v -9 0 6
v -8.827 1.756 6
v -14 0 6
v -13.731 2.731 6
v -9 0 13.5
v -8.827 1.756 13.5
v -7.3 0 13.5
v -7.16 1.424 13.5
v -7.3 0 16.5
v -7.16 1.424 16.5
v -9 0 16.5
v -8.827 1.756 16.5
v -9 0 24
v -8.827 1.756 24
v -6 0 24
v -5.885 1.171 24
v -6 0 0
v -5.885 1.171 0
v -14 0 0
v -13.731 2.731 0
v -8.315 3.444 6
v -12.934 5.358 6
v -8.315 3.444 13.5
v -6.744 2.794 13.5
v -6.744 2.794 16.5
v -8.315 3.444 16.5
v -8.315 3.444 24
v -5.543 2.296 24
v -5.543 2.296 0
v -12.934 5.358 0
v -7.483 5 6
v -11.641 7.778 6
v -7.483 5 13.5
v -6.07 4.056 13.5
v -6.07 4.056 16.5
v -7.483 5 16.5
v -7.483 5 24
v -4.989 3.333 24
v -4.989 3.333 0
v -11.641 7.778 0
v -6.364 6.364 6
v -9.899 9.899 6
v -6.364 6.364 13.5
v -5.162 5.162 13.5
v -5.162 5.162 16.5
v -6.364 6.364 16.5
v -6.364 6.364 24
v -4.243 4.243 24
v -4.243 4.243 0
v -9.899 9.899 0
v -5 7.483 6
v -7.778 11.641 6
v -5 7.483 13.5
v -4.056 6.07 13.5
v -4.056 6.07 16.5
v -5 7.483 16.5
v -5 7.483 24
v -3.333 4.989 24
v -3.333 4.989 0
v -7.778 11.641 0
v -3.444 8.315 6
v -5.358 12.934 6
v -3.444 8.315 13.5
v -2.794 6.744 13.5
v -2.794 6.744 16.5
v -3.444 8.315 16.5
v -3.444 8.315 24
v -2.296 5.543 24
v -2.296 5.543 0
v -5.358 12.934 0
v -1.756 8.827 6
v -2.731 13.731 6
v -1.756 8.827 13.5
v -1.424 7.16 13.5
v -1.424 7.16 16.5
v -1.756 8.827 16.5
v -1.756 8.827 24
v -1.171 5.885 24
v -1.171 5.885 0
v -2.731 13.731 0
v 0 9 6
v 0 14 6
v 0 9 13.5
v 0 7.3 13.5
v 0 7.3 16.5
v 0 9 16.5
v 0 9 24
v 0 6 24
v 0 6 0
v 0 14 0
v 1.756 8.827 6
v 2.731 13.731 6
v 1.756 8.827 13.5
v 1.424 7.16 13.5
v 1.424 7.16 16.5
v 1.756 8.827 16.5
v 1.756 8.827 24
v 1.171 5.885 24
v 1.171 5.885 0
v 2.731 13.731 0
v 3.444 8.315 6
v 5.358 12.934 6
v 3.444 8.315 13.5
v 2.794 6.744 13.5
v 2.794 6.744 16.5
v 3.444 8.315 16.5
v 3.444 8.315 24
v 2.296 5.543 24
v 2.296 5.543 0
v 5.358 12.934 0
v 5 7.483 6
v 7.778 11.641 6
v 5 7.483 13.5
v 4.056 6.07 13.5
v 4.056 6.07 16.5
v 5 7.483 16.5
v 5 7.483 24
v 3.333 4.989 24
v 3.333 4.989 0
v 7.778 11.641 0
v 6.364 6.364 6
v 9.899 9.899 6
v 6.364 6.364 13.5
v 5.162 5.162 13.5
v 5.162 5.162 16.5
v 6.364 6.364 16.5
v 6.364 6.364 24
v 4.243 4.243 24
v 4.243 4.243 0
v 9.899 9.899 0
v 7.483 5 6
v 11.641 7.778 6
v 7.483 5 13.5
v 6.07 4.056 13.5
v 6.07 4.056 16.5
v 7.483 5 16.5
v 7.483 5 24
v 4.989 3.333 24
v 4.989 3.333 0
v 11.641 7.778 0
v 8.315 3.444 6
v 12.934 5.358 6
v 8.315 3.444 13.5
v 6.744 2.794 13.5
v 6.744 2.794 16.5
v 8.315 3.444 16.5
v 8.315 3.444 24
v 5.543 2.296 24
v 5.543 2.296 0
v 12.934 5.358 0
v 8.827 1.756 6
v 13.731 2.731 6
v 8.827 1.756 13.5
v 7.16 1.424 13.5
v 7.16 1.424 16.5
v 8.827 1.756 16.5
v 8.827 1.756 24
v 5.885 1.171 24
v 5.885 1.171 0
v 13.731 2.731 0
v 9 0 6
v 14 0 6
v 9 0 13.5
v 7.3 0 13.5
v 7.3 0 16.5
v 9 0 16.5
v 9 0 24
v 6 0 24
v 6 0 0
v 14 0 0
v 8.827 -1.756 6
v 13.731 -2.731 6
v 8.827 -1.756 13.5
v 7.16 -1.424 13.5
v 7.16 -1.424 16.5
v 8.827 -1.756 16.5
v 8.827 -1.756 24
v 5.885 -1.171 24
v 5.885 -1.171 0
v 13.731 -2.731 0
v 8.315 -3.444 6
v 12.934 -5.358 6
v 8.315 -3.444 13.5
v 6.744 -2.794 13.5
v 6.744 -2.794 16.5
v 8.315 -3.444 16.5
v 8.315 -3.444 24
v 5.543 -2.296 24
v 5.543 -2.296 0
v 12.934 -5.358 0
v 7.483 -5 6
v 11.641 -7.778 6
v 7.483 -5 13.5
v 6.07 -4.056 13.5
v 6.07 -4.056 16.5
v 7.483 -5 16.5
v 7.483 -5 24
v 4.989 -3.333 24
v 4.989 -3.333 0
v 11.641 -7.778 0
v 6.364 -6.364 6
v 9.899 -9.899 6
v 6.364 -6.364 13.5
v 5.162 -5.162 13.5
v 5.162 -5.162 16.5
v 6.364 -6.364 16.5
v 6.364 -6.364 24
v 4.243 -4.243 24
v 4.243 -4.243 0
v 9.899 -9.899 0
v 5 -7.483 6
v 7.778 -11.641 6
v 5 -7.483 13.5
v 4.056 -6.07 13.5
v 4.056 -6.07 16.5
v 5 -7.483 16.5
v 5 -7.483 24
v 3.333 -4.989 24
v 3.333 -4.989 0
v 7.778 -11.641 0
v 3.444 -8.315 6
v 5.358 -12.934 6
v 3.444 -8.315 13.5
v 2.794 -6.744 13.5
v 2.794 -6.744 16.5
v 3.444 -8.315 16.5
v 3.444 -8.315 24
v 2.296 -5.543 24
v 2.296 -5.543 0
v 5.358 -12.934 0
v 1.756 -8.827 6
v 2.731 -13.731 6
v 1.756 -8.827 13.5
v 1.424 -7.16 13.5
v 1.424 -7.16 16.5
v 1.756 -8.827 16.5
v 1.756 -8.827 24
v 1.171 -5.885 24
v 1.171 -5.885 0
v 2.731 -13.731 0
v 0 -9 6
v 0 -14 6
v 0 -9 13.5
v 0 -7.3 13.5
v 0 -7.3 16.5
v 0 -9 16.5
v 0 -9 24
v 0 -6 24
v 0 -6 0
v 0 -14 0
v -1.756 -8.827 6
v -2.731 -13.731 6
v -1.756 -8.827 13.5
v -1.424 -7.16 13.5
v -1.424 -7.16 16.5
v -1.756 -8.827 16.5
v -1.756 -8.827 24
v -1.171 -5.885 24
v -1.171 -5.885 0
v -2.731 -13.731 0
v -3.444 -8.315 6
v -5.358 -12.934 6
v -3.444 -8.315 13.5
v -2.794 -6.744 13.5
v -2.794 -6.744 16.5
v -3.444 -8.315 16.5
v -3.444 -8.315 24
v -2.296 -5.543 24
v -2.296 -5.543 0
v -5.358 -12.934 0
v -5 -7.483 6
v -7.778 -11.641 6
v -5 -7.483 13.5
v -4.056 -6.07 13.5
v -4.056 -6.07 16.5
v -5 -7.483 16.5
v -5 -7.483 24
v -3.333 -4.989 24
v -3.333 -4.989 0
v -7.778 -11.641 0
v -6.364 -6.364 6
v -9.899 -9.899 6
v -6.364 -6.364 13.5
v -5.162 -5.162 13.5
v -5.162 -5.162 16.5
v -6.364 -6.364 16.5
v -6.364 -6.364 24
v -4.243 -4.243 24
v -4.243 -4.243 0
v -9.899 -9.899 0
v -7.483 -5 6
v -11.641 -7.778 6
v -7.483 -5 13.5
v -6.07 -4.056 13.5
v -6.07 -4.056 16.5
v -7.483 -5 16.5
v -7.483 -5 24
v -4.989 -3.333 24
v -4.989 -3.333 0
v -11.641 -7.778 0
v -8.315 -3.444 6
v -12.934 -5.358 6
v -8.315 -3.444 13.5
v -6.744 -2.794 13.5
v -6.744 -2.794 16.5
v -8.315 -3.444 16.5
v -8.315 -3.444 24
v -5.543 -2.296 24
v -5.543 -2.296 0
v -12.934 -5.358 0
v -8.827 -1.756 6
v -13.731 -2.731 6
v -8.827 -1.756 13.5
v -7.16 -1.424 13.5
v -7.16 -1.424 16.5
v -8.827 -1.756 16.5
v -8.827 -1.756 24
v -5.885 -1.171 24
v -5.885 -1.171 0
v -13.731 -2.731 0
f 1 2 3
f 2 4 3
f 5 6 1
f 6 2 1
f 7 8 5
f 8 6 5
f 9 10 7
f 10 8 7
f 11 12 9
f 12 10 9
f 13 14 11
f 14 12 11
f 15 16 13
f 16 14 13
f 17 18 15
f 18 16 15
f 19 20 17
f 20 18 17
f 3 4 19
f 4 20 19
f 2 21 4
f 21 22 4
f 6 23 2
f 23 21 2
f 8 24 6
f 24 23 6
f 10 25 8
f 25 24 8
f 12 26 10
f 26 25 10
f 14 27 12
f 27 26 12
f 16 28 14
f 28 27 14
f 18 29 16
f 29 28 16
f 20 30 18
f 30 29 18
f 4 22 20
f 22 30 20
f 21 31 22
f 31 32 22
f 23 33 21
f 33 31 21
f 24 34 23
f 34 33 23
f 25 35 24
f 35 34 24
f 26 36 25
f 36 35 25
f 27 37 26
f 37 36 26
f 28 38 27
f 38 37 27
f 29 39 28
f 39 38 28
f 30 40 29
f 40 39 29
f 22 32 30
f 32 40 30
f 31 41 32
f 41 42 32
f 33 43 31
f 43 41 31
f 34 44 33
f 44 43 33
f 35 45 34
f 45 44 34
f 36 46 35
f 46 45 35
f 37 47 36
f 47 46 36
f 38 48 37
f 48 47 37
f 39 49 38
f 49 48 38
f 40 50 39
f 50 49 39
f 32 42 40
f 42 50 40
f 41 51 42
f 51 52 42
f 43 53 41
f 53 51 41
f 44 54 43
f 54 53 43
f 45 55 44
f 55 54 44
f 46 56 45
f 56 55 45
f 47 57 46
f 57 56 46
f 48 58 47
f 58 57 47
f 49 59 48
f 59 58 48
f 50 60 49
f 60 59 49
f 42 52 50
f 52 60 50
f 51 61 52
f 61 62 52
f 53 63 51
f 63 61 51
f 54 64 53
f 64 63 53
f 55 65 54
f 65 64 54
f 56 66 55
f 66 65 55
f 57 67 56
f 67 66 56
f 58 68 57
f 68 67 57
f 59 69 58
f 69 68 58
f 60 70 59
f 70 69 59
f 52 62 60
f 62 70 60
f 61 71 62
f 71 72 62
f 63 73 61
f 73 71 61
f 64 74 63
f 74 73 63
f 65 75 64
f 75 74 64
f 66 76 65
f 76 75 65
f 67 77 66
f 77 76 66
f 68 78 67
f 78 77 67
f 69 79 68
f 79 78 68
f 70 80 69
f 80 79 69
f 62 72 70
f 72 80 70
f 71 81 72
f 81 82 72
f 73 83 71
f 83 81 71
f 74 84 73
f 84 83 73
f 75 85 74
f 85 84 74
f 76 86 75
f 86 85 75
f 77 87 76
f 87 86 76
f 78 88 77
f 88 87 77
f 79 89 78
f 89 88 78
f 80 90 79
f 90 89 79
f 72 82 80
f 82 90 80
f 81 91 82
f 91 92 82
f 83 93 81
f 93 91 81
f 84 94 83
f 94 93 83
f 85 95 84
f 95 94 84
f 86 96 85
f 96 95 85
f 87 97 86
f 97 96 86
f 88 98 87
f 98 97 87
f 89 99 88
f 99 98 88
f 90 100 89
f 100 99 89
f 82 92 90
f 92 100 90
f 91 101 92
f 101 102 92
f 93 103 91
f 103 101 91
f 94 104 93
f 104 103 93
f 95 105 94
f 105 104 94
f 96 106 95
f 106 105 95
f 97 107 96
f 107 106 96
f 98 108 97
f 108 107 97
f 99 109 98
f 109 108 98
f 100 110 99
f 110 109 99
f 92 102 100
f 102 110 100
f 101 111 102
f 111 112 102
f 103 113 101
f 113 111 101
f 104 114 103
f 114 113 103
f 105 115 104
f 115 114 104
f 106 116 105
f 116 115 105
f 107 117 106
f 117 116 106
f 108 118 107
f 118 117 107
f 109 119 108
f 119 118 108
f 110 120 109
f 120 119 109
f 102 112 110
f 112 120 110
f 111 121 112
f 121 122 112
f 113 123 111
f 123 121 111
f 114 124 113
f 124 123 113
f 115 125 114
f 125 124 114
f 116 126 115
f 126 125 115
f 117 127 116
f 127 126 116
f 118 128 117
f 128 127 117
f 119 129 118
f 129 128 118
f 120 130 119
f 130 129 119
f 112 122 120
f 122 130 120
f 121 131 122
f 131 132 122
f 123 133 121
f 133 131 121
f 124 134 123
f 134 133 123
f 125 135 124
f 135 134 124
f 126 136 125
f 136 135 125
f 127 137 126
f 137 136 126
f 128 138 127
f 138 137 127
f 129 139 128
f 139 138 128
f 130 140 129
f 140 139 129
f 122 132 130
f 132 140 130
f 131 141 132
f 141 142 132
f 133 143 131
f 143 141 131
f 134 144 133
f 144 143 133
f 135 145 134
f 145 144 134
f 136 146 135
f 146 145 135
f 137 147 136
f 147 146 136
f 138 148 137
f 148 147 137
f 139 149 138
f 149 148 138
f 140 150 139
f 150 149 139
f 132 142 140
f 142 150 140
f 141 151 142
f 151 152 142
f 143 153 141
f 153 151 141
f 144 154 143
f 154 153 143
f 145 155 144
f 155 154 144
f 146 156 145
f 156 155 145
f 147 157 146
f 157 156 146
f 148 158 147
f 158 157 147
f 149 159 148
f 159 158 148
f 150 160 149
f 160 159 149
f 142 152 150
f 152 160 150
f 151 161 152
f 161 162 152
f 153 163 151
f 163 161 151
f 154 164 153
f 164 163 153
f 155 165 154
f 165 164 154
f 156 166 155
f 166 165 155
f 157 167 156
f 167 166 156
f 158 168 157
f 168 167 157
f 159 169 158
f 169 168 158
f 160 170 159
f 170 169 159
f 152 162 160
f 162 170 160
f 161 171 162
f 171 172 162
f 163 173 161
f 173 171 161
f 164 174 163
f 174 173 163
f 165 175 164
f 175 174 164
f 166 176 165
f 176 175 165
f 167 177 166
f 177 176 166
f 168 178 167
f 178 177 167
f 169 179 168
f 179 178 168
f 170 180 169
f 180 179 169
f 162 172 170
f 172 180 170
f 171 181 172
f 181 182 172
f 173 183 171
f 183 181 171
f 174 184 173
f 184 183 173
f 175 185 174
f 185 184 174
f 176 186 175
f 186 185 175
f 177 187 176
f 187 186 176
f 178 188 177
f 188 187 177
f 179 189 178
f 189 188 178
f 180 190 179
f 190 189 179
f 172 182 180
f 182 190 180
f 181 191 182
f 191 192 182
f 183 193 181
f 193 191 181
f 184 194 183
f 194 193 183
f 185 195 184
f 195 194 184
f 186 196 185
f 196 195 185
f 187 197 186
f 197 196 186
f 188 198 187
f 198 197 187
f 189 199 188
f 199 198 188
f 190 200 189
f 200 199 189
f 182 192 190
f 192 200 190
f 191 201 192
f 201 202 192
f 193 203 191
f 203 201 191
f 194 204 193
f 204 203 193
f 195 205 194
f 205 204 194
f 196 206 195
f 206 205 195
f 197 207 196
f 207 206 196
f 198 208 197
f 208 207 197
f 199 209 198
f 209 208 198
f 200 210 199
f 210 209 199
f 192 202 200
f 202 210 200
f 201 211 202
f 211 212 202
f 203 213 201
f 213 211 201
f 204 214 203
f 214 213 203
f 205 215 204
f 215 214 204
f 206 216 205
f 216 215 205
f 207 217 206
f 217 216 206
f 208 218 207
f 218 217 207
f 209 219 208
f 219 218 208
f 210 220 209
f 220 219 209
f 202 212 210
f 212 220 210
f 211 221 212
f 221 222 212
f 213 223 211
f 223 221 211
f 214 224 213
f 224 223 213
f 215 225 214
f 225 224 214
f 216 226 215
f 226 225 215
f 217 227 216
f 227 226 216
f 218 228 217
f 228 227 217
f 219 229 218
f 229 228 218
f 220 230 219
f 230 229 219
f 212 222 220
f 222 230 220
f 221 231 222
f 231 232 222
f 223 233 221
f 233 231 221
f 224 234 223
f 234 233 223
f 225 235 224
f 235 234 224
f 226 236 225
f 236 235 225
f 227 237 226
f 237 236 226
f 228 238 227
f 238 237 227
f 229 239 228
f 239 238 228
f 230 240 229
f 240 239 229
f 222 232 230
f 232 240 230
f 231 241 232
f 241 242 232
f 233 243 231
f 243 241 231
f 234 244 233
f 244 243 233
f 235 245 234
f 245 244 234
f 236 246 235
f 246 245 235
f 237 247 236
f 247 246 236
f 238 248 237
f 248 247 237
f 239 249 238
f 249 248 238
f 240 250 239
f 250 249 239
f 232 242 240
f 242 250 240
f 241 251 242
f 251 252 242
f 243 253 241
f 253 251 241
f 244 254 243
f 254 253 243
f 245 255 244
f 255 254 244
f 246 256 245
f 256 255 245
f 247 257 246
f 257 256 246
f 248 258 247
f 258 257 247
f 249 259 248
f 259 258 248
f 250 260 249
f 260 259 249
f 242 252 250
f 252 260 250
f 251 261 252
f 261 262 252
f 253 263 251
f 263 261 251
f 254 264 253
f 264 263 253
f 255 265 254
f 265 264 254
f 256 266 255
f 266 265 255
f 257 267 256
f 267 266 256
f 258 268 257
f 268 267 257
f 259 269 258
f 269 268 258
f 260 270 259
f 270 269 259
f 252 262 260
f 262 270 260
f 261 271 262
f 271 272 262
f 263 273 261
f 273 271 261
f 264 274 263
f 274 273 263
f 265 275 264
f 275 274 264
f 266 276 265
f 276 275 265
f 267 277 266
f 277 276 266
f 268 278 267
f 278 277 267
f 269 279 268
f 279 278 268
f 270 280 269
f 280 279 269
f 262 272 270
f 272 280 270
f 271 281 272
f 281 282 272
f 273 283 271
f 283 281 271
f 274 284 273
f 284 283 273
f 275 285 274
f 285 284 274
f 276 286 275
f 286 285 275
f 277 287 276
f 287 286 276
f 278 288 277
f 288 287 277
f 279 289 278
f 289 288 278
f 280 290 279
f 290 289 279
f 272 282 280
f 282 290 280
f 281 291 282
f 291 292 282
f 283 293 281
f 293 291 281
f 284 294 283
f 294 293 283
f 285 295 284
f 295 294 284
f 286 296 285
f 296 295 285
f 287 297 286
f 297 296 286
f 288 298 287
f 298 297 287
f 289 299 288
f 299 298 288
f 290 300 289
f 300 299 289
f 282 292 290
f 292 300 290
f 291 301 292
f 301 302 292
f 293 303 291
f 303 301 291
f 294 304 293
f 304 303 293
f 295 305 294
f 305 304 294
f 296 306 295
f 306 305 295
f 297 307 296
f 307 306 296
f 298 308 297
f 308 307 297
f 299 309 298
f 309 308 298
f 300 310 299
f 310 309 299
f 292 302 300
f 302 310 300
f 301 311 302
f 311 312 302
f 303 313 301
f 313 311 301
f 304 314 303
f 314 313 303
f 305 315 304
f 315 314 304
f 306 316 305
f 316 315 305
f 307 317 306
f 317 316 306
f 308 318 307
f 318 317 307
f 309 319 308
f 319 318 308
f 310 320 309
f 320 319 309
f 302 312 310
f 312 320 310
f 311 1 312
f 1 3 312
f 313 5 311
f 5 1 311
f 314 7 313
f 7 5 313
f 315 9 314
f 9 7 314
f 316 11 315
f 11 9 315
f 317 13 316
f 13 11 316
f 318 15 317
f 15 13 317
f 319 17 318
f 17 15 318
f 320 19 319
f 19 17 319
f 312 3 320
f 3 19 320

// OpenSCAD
$fn = 32;

// ----------------------------------------------------------------------
// Grooved revolve: flanged, bore R6
// ----------------------------------------------------------------------

// --- parameters (mm) ---
bore_r = 6;               // bore radius
outer_r = 9;              // outer radius of the body
total_h = 24;             // overall height, Z
wall = 3;                 // radial wall thickness
groove_w = 3;             // groove width
groove_d = 1.7;           // groove depth
grooves = 1;              // number of outer grooves
flange_r = 14;            // flange radius
flange_h = 6;             // flange height

bbox_x = 2 * flange_r;  // full diameter
bore_d = 2 * bore_r;  // bore diameter
body_d = 2 * outer_r;  // body diameter
flange_d = 2 * flange_r;  // flange diameter
revolve_angle = 360;  // full turn around the Z axis

profile = [[6, 0], [9, 0], [14, 0], [14, 6], [9, 6], [9, 13.5], [7.3, 13.5], [7.3, 16.5], [9, 16.5], [9, 24], [6, 24]];  // primary outline, 11 points, counter clockwise

// --- the one profile operation ---
rotate_extrude(angle = revolve_angle) polygon(points = profile);
